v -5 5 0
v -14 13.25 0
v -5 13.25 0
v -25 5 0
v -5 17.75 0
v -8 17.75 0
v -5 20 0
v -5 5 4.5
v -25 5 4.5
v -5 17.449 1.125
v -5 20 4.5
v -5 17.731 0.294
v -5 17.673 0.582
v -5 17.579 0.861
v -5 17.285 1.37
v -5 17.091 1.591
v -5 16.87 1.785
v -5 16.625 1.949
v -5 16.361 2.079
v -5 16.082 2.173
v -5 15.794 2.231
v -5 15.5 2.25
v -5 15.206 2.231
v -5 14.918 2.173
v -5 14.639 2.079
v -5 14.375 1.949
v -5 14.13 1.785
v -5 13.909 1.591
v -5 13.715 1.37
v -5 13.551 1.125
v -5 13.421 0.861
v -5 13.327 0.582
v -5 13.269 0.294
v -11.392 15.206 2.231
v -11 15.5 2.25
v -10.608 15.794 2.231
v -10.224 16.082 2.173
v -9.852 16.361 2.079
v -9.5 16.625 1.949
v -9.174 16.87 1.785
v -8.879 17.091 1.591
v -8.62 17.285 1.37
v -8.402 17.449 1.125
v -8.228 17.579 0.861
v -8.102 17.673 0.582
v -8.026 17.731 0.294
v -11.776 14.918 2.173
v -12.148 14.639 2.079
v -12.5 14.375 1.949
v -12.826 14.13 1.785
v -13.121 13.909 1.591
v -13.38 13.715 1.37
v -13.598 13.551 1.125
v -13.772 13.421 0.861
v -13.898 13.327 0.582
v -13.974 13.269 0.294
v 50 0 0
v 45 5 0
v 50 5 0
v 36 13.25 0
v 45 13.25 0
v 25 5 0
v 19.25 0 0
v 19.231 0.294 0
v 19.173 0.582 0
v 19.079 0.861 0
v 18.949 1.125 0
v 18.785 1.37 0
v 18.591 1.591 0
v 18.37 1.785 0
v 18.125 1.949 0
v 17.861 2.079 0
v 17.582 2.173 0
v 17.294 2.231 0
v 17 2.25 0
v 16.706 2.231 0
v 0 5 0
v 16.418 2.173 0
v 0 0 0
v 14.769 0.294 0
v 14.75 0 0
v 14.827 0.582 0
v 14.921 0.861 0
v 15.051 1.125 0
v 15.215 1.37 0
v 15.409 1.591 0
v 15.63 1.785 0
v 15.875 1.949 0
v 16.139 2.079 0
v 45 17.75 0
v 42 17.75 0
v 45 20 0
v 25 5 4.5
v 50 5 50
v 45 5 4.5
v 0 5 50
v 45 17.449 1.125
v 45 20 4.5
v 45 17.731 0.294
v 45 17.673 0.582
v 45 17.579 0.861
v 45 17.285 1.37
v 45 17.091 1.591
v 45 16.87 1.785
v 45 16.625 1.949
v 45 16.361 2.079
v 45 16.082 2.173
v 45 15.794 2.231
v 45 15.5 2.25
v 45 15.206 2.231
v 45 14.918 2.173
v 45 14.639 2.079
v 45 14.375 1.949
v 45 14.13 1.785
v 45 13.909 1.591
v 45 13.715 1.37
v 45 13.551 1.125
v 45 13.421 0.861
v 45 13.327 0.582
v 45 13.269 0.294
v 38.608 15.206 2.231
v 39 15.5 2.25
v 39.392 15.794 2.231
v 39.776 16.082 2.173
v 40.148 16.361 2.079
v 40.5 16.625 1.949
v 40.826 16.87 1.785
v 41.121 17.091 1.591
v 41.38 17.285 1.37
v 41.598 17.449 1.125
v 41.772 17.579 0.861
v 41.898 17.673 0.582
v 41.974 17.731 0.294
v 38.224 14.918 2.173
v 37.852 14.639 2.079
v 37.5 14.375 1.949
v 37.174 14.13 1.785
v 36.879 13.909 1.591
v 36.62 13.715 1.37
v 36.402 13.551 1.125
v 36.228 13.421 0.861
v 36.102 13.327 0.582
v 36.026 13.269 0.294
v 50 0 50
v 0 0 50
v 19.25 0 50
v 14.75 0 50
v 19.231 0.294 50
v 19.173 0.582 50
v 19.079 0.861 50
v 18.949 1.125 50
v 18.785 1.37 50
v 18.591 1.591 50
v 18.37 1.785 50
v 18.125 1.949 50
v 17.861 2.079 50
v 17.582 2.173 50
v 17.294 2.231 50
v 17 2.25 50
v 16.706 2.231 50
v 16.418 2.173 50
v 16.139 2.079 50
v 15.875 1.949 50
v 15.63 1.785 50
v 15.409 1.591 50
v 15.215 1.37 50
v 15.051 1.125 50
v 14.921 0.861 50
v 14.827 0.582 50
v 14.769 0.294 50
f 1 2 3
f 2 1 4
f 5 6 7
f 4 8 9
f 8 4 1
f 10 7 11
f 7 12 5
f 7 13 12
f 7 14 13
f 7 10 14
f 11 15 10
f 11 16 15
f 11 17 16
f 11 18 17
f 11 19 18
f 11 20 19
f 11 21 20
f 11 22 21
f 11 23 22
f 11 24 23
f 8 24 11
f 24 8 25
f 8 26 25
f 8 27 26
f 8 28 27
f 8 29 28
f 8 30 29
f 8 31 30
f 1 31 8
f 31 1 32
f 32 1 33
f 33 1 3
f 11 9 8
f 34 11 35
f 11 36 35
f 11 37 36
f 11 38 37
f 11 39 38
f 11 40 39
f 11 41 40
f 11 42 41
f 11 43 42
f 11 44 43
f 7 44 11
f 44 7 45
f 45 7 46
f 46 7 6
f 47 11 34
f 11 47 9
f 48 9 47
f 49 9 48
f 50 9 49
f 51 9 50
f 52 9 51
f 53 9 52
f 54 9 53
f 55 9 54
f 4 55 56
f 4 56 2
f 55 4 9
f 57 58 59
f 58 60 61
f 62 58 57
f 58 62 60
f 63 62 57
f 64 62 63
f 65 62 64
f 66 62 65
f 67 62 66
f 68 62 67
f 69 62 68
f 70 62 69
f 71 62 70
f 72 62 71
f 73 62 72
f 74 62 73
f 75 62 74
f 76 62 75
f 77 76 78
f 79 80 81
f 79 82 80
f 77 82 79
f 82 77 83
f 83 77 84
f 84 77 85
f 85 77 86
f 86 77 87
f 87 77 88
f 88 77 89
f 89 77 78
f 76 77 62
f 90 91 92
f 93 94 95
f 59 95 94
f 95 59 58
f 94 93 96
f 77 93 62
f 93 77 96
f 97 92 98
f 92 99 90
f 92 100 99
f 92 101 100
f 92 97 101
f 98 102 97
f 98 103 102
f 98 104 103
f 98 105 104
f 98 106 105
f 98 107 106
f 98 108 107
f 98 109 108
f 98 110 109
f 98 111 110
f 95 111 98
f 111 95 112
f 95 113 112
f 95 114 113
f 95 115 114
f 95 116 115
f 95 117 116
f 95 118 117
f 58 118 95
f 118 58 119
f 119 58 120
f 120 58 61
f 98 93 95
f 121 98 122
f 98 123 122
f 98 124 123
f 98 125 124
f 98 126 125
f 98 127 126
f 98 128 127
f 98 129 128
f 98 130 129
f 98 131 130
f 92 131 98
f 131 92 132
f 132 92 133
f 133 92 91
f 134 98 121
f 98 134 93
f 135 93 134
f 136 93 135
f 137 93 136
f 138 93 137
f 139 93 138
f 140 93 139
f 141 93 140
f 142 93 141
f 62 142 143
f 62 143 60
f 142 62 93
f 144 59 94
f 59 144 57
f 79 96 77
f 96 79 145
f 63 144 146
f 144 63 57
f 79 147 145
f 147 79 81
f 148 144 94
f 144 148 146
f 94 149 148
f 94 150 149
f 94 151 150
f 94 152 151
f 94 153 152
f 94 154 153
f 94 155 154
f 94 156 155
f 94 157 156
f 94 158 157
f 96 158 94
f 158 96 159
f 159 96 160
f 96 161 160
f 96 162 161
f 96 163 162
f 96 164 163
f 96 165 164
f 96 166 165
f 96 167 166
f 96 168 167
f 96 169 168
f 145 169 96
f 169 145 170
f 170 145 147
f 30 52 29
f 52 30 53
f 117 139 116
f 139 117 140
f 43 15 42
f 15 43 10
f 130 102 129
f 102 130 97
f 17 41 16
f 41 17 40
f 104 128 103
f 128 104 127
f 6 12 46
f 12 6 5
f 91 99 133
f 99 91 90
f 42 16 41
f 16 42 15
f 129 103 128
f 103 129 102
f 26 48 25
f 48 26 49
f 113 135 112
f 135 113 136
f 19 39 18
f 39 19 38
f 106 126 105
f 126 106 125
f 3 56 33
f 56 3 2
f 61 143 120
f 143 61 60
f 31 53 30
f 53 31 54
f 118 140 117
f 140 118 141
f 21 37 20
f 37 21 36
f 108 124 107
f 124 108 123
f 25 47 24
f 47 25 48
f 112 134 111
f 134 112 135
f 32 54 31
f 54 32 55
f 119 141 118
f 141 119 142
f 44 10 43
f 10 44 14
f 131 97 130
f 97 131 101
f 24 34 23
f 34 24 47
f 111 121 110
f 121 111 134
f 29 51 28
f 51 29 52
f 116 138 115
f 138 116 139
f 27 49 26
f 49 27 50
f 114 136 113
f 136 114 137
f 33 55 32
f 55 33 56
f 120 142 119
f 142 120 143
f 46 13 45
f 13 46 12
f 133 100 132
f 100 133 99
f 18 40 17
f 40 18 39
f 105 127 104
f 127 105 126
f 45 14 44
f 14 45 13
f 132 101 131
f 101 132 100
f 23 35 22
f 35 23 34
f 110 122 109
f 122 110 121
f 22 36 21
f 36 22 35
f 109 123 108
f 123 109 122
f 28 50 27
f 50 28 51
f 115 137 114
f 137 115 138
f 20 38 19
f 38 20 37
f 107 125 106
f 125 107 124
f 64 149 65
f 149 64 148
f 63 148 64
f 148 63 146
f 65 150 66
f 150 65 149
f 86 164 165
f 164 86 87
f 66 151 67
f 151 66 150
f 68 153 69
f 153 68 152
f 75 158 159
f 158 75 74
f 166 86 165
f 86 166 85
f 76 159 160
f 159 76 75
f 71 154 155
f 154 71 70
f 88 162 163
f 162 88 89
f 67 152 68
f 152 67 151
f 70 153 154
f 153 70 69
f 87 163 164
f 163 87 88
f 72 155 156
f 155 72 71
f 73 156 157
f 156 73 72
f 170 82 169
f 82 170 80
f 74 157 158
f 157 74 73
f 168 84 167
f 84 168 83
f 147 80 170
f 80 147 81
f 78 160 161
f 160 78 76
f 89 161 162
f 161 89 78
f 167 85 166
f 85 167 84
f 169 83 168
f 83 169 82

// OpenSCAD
// L-shaped mounting bracket for a NEMA 17 stepper motor (syringe pump, bench top). NOVEL general part.
//

base_d  = 50;
base_t  = 5;
arm_l   = 50;
arm_t   = 5;
reach   = 50;
screw  = 4.5;

$fn = 48;

gusset_t = 5;

difference() {
    union() {
        cube([base_d, base_t, base_t]);              // base plate (square, not rectangular - the user's X span -25..25 is 50 mm)
        cube([base_d, base_t, reach]);               // vertical motor plate
        for (x = [-25, 25])
            translate([x, 0, 0])
                linear_extrude(screw)
                    polygon([[0, 5], [20, 5], [20, 20]]);   // gussets: right triangle in the YZ plane, legs 20 x 20, right angle at (y=5, z=5)
    }
    translate([-17, 0, -1]) cylinder(h = base_t + reach + 2, d = screw);                 // 2 vertical through-holes (M4)
    translate([17, 0, -1]) cylinder(h = base_t + reach + 2, d = screw);
    translate([0, -16, 28]) rotate([0, 90, 0]) cylinder(h = base_t + reach + 2, d = 23); // motor boss hole (along Y)
    for (p = [[-15.5, -15.5], [-15.5, 15.5], [15.5, -15.5], [15.5, 15.5]])
        translate(p) rotate([0, 90, 0]) cylinder(h = base_t + reach + 2, d = screw);      // M3 screw holes for the boss
}
